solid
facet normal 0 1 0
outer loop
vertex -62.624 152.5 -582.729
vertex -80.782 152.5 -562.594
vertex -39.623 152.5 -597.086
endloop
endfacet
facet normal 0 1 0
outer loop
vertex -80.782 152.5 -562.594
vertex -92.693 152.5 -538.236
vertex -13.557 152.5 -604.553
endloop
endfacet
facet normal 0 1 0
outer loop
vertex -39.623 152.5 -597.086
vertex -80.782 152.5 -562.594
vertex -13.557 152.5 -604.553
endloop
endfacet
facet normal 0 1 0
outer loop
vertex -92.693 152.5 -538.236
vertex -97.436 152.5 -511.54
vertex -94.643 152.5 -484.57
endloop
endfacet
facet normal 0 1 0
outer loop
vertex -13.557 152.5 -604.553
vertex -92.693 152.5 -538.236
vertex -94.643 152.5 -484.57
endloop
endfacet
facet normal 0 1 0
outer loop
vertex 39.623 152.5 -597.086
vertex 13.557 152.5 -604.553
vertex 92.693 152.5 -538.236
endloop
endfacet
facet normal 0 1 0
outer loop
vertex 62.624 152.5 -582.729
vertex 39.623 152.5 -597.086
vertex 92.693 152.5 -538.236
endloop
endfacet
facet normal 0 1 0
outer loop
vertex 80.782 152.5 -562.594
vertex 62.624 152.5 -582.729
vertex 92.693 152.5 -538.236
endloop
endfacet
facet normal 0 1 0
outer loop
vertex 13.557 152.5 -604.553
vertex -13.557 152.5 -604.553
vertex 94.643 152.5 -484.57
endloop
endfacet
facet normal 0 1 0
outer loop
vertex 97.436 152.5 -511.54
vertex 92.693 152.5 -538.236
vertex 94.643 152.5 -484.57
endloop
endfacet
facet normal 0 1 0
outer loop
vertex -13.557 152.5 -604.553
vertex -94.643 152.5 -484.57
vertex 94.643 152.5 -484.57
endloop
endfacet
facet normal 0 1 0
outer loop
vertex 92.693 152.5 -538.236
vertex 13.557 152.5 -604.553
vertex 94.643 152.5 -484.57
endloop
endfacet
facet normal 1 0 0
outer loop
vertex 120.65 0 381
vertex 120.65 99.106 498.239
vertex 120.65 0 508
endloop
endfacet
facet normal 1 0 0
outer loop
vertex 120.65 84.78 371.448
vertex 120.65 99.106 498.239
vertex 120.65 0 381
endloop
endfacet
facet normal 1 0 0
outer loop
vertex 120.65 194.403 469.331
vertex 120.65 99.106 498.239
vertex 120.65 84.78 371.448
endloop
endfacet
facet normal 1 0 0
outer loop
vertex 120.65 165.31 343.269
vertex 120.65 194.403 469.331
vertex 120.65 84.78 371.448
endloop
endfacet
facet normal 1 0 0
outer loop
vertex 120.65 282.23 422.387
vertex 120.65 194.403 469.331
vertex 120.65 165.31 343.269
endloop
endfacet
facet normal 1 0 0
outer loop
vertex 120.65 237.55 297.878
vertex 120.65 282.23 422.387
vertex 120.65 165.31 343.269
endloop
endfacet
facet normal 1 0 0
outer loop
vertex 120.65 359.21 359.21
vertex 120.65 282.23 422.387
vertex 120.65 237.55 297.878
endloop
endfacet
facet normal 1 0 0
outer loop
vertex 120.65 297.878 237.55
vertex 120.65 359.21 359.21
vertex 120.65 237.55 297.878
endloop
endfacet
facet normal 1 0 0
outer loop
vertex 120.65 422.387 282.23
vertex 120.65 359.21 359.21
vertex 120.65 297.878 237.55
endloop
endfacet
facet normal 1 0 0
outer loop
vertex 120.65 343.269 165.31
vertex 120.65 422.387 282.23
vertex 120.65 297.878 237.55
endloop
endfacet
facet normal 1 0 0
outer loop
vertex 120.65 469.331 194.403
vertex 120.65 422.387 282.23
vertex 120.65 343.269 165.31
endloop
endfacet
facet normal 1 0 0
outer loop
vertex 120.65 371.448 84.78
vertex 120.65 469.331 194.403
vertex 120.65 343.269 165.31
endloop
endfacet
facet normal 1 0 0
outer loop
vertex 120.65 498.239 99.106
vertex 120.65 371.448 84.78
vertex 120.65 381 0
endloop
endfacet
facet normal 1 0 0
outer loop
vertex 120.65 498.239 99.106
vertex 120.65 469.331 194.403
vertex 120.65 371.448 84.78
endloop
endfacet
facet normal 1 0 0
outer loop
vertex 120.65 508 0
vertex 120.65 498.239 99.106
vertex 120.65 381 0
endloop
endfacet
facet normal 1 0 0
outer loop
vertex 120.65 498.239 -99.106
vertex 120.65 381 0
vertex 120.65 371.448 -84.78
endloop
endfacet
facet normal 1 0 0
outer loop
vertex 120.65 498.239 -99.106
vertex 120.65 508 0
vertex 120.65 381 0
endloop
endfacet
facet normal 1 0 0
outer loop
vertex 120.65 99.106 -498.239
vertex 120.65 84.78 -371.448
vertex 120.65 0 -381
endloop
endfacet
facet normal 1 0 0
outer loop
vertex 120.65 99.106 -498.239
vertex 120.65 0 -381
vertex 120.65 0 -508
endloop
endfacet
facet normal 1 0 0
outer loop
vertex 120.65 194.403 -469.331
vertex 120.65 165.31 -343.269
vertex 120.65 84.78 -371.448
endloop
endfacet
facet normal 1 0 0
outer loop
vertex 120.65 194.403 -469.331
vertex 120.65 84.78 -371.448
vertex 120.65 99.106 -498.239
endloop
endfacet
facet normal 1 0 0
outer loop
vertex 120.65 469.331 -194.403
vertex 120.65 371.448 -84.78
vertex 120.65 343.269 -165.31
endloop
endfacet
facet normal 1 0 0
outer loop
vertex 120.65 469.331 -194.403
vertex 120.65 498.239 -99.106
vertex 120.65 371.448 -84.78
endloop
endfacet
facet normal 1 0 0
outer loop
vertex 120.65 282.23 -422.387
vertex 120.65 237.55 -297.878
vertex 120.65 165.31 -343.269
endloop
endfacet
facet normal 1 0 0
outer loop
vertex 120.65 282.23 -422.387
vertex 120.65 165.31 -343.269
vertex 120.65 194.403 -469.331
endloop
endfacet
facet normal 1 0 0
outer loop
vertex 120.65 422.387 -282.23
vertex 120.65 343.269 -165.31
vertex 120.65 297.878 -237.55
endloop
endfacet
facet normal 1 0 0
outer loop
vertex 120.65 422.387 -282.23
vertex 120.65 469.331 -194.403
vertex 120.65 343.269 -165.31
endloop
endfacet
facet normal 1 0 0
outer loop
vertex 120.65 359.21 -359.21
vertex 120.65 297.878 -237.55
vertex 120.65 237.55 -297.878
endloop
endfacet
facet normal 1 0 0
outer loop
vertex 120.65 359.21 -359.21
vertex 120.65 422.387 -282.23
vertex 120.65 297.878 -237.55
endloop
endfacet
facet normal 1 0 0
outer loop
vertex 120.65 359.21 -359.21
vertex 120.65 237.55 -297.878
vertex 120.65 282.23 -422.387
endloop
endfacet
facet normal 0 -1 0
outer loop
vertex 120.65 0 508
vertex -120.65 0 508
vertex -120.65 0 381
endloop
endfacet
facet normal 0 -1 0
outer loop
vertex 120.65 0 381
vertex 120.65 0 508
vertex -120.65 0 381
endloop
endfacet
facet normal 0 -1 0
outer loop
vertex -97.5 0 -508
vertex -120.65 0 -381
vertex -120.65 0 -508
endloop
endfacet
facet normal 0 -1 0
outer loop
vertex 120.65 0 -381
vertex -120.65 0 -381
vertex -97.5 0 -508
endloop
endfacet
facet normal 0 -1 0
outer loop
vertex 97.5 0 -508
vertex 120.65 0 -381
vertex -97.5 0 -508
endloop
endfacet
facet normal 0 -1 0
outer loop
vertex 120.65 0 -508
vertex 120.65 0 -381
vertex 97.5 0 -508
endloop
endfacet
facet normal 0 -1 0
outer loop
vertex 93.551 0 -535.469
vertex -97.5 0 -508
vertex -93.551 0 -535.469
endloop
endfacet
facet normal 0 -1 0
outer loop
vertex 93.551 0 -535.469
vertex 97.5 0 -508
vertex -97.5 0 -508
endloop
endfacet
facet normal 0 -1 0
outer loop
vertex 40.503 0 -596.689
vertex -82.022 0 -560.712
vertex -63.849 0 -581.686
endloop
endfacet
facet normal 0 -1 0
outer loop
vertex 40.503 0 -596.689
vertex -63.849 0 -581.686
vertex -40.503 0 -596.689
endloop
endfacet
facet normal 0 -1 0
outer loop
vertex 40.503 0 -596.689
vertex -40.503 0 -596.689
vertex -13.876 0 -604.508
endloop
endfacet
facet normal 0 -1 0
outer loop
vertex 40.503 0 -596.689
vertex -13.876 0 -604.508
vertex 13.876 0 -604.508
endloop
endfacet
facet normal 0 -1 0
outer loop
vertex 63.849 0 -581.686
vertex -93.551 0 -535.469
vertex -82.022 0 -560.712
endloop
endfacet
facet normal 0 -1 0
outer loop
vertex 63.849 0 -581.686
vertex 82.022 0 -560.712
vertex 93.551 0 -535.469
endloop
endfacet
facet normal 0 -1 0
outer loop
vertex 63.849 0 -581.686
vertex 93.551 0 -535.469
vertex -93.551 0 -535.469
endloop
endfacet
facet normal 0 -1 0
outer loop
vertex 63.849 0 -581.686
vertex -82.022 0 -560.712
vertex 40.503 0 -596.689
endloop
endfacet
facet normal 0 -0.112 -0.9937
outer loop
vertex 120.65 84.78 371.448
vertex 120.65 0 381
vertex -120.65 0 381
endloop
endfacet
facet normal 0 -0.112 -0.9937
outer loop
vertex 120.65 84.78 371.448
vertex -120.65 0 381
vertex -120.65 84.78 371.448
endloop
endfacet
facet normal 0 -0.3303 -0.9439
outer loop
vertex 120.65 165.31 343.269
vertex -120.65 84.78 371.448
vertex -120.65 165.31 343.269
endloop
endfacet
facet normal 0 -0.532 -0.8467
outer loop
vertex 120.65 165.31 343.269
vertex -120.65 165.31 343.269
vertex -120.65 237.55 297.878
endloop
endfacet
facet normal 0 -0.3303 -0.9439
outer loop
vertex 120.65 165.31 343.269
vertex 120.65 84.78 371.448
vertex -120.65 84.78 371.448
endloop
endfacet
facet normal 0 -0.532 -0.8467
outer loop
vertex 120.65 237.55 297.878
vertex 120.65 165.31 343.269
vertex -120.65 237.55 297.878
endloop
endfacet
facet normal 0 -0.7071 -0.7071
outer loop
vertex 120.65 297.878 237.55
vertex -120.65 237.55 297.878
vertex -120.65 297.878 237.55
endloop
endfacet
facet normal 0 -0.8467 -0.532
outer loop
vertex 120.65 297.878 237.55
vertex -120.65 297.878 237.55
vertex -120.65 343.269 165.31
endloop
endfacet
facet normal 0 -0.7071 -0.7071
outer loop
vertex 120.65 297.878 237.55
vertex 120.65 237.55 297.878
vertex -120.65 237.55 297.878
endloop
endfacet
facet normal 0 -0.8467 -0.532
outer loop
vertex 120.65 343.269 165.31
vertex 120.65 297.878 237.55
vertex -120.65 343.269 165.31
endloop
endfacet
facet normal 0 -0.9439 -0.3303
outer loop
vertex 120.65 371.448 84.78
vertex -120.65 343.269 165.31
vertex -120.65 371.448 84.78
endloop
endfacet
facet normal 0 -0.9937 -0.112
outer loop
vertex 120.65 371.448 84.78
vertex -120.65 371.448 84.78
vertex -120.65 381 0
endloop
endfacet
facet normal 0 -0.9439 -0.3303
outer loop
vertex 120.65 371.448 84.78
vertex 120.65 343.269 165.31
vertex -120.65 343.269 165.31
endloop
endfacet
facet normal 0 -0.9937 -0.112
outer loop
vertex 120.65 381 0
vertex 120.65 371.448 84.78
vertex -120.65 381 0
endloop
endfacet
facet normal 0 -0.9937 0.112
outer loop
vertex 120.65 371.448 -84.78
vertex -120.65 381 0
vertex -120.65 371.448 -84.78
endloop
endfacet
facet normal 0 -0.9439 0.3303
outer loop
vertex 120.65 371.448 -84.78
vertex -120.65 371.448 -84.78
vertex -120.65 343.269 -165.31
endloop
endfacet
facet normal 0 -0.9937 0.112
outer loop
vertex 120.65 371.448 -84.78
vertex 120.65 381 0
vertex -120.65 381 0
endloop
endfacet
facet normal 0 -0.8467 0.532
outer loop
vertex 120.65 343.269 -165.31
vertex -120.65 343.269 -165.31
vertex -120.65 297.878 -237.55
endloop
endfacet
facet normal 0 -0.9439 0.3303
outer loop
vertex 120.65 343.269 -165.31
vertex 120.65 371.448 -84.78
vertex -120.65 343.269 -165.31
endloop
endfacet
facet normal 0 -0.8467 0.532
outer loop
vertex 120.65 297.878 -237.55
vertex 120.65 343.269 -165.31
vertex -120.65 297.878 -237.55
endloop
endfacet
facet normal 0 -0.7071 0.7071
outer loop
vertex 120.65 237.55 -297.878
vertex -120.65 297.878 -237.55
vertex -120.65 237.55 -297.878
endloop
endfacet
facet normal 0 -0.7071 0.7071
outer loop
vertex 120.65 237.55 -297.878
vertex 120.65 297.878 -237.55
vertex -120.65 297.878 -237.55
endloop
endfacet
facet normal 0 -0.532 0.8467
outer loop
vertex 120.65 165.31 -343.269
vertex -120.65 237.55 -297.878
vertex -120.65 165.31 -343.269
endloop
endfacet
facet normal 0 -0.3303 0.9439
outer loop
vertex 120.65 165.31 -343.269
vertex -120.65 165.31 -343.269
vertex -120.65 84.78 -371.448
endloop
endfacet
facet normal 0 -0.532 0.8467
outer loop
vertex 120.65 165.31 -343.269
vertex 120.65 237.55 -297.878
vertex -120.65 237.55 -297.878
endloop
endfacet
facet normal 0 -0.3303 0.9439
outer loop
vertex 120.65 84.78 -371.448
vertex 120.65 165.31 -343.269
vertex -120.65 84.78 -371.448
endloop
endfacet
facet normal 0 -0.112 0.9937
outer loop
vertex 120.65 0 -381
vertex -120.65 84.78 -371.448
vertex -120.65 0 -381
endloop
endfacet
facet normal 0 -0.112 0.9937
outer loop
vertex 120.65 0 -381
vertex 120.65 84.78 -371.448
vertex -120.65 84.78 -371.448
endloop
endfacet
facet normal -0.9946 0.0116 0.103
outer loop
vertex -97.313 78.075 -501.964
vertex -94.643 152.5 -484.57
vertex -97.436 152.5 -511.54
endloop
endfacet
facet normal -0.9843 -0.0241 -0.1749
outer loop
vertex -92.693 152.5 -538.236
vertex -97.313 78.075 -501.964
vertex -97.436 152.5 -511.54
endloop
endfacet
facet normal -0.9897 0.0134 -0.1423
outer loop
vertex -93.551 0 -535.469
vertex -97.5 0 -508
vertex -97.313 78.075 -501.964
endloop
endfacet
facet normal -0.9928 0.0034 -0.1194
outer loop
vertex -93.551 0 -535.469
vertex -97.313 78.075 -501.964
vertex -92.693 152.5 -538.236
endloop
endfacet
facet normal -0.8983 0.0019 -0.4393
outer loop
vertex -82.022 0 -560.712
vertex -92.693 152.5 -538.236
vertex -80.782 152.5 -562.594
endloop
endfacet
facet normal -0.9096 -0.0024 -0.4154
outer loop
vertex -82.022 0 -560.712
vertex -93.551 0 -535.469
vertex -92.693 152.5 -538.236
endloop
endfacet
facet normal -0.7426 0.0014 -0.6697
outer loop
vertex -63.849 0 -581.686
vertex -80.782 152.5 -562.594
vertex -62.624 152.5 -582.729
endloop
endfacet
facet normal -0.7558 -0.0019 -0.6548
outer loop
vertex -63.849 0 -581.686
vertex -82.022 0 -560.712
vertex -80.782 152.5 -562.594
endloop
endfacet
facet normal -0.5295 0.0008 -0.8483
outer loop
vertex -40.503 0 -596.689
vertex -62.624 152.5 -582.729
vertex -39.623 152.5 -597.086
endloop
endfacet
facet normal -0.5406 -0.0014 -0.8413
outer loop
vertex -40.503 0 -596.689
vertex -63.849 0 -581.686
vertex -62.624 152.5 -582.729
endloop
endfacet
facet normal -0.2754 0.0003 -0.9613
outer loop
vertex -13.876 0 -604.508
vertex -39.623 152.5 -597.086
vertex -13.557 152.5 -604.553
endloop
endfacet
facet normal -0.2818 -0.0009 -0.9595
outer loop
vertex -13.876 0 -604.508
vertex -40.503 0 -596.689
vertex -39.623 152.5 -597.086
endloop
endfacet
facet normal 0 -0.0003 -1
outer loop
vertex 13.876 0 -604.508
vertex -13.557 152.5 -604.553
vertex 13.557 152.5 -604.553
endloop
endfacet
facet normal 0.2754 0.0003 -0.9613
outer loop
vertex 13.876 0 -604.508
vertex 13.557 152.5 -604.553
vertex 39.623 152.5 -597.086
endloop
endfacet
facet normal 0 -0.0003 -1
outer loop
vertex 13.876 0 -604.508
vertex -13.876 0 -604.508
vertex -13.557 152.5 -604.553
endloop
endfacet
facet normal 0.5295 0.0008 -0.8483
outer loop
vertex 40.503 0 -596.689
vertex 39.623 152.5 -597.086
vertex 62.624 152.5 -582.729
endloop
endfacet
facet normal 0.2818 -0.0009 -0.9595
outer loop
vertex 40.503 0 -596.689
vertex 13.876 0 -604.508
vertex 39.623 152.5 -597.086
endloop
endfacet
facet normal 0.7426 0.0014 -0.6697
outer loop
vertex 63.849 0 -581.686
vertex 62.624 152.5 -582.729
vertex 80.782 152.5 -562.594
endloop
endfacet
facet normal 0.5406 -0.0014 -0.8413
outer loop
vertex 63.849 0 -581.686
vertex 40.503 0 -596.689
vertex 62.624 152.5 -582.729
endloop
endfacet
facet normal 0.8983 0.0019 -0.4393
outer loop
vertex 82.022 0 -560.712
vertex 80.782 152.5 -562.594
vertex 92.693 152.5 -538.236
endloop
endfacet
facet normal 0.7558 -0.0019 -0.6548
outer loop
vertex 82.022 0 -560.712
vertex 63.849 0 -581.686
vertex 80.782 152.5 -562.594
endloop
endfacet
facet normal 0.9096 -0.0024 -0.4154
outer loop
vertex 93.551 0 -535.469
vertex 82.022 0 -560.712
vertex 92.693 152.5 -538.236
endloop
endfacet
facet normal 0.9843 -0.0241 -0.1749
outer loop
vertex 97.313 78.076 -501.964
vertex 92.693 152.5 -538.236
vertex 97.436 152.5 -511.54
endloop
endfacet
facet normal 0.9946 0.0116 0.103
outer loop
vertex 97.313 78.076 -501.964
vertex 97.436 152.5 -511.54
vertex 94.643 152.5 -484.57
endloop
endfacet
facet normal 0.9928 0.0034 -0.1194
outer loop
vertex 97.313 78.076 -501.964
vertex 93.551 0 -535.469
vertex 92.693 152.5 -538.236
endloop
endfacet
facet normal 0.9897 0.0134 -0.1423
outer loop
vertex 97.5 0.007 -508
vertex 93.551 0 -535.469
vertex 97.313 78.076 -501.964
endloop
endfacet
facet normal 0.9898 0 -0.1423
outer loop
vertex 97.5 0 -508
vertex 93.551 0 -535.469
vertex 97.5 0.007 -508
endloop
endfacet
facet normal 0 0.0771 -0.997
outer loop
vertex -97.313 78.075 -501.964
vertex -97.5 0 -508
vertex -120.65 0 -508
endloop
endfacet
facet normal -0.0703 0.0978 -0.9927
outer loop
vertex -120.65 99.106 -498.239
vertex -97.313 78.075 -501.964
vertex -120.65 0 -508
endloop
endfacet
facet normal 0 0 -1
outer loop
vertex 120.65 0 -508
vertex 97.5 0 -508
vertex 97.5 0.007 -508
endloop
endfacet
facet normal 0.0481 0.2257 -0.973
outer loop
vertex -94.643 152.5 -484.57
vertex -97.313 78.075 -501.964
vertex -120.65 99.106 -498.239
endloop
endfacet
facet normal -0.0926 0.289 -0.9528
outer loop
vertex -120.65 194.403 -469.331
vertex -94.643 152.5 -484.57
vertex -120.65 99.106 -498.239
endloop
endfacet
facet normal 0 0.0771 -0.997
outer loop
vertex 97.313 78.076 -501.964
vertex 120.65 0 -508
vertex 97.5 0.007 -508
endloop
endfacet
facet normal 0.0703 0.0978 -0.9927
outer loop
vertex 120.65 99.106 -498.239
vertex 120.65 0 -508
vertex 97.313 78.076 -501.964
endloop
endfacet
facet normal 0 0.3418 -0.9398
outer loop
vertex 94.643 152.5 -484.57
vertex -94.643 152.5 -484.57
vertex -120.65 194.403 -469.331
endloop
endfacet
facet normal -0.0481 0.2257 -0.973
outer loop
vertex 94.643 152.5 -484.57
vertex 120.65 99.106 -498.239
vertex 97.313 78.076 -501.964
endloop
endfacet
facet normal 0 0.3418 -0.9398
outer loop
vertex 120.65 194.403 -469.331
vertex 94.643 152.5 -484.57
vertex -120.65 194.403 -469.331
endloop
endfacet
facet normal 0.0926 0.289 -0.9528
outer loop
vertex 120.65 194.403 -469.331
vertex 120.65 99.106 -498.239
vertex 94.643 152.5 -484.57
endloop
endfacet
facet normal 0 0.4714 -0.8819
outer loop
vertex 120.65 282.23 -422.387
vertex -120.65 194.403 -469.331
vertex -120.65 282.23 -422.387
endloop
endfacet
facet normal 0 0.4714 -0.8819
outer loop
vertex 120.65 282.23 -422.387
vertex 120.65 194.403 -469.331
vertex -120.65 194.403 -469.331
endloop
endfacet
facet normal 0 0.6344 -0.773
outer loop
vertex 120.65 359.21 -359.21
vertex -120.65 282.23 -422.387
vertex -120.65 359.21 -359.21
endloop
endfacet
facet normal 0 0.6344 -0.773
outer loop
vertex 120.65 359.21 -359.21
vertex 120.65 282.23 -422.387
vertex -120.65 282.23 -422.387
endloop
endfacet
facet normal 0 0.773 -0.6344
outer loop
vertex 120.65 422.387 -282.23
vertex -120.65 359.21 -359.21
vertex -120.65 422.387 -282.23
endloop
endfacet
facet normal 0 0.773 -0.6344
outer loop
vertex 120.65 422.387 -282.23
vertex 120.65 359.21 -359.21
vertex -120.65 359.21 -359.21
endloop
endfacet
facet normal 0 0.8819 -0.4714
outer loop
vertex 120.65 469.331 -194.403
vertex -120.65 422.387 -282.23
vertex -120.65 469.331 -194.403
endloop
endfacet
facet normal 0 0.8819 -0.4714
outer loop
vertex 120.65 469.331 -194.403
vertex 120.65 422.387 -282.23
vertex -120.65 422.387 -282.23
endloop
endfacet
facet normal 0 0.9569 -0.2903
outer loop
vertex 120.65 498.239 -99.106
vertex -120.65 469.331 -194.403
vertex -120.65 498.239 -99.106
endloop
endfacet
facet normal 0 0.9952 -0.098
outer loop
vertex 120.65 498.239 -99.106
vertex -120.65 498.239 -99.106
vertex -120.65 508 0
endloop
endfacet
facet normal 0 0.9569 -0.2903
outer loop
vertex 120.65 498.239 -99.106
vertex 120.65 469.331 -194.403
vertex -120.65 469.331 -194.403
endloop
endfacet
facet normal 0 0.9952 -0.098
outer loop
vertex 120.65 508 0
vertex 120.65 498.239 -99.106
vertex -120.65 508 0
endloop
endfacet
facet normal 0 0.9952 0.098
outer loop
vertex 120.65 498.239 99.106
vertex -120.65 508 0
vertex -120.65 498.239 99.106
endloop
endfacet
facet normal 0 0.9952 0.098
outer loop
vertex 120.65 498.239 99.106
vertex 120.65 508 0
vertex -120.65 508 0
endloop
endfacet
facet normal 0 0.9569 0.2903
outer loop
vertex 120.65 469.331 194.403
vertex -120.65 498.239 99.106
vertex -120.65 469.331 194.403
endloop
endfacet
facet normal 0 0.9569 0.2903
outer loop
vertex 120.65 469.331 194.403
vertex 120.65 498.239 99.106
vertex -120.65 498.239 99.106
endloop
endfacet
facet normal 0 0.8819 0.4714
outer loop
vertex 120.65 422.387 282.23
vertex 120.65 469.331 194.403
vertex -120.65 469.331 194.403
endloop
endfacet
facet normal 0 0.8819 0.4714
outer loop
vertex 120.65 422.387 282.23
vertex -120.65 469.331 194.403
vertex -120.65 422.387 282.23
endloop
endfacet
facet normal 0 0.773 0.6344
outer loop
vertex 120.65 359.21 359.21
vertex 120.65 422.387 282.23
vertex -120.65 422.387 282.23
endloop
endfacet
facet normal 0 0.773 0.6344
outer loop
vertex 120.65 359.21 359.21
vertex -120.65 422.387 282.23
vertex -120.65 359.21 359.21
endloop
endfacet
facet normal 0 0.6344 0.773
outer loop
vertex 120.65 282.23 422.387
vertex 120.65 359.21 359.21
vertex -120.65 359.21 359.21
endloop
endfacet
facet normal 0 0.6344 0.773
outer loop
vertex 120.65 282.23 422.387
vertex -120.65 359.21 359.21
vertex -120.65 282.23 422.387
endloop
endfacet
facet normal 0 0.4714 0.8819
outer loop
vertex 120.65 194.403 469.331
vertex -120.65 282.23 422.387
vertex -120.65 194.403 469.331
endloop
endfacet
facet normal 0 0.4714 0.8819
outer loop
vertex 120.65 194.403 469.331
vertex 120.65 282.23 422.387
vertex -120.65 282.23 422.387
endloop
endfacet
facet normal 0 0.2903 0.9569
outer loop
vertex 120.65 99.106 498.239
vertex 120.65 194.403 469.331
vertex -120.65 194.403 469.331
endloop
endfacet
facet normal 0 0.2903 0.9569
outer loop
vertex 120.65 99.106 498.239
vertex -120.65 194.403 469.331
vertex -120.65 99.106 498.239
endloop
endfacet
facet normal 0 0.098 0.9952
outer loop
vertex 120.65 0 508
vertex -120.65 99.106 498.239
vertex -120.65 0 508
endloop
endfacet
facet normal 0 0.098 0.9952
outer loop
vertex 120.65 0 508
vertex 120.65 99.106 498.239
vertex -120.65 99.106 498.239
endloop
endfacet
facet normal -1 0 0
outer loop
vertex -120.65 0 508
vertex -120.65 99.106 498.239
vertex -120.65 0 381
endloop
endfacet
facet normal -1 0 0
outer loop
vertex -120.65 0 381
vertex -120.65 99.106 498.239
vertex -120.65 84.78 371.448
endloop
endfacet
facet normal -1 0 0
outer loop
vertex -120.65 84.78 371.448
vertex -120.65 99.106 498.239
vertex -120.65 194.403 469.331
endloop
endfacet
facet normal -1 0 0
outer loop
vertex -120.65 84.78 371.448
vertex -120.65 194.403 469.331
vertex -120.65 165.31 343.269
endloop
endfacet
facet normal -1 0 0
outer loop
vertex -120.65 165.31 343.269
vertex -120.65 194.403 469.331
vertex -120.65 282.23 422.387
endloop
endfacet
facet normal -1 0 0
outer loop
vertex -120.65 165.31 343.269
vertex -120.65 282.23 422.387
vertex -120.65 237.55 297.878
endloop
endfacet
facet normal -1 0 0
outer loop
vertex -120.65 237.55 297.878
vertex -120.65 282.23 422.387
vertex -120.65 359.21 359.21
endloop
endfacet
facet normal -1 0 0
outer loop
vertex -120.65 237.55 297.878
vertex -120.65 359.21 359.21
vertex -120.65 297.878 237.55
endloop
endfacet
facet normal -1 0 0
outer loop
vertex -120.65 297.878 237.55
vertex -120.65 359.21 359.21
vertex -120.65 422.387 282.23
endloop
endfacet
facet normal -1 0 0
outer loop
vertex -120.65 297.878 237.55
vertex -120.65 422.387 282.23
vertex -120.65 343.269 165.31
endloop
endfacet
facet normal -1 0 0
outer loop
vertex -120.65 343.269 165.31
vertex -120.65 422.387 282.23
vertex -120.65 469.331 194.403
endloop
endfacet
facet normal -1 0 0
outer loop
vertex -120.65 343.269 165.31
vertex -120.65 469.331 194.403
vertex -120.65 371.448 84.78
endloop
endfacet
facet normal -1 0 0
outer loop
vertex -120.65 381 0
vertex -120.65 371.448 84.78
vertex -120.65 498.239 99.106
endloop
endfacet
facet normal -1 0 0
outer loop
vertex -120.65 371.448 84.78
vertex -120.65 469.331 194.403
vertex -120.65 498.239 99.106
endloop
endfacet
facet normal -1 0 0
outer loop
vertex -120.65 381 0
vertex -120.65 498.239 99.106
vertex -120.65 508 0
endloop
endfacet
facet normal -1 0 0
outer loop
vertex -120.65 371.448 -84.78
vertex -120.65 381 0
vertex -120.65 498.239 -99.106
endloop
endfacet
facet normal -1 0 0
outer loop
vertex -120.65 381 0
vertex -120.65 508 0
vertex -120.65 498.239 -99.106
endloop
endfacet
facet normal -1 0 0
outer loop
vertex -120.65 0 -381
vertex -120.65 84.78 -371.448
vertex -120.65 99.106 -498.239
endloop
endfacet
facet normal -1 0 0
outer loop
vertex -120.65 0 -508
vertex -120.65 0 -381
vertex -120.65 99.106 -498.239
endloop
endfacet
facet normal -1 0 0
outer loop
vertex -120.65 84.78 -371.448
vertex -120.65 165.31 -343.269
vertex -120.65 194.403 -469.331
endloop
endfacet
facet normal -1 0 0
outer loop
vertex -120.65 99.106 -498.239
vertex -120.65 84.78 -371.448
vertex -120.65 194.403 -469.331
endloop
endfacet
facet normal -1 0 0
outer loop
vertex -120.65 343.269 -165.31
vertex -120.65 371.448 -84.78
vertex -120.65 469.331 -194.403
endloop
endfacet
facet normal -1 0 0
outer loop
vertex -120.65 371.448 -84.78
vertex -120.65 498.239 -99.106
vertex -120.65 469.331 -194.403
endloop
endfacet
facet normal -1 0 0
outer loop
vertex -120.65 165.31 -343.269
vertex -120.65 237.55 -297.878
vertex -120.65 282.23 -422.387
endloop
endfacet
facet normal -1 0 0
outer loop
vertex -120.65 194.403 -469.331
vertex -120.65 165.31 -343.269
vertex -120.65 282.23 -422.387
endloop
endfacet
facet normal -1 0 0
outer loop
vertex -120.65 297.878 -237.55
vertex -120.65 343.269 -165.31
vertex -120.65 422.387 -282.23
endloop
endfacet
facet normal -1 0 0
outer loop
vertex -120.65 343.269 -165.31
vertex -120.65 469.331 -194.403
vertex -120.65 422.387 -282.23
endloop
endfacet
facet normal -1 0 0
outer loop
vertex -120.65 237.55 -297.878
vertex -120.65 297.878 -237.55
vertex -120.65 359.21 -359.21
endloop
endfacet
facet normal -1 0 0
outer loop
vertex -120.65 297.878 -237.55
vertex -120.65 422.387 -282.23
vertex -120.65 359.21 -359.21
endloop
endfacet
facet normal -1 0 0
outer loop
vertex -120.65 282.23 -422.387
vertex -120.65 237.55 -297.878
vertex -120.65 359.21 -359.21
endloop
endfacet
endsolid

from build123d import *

# Parameters (mm, degrees)
BOSS_EXTRUDE1_DEPTH = 120.65
SKETCH2_R           = 97.5
BOSS_EXTRUDE2_DEPTH = 152.5


with BuildPart() as part:
    # Sketch1 → Boss-Extrude1 (new, symmetric)
    with BuildSketch(Plane(origin=(0, 0, 0), x_dir=(0, 0, -1), z_dir=(1, 0, 0))):
        with BuildLine():
            ThreePointArc((508, 0), (0, 508), (-508, 0))
            Line((-508, 0), (-381, 0))
            ThreePointArc((-381, 0), (0, 381), (381, 0))
            Line((381, 0), (508, 0))
        make_face()
    extrude(amount=BOSS_EXTRUDE1_DEPTH, both=True)

    # Sketch2 → Boss-Extrude2 (add)
    with BuildSketch(Plane.XZ):
        with Locations((0, -508)):
            Circle(SKETCH2_R)
    extrude(amount=-BOSS_EXTRUDE2_DEPTH)


solid = part.part
